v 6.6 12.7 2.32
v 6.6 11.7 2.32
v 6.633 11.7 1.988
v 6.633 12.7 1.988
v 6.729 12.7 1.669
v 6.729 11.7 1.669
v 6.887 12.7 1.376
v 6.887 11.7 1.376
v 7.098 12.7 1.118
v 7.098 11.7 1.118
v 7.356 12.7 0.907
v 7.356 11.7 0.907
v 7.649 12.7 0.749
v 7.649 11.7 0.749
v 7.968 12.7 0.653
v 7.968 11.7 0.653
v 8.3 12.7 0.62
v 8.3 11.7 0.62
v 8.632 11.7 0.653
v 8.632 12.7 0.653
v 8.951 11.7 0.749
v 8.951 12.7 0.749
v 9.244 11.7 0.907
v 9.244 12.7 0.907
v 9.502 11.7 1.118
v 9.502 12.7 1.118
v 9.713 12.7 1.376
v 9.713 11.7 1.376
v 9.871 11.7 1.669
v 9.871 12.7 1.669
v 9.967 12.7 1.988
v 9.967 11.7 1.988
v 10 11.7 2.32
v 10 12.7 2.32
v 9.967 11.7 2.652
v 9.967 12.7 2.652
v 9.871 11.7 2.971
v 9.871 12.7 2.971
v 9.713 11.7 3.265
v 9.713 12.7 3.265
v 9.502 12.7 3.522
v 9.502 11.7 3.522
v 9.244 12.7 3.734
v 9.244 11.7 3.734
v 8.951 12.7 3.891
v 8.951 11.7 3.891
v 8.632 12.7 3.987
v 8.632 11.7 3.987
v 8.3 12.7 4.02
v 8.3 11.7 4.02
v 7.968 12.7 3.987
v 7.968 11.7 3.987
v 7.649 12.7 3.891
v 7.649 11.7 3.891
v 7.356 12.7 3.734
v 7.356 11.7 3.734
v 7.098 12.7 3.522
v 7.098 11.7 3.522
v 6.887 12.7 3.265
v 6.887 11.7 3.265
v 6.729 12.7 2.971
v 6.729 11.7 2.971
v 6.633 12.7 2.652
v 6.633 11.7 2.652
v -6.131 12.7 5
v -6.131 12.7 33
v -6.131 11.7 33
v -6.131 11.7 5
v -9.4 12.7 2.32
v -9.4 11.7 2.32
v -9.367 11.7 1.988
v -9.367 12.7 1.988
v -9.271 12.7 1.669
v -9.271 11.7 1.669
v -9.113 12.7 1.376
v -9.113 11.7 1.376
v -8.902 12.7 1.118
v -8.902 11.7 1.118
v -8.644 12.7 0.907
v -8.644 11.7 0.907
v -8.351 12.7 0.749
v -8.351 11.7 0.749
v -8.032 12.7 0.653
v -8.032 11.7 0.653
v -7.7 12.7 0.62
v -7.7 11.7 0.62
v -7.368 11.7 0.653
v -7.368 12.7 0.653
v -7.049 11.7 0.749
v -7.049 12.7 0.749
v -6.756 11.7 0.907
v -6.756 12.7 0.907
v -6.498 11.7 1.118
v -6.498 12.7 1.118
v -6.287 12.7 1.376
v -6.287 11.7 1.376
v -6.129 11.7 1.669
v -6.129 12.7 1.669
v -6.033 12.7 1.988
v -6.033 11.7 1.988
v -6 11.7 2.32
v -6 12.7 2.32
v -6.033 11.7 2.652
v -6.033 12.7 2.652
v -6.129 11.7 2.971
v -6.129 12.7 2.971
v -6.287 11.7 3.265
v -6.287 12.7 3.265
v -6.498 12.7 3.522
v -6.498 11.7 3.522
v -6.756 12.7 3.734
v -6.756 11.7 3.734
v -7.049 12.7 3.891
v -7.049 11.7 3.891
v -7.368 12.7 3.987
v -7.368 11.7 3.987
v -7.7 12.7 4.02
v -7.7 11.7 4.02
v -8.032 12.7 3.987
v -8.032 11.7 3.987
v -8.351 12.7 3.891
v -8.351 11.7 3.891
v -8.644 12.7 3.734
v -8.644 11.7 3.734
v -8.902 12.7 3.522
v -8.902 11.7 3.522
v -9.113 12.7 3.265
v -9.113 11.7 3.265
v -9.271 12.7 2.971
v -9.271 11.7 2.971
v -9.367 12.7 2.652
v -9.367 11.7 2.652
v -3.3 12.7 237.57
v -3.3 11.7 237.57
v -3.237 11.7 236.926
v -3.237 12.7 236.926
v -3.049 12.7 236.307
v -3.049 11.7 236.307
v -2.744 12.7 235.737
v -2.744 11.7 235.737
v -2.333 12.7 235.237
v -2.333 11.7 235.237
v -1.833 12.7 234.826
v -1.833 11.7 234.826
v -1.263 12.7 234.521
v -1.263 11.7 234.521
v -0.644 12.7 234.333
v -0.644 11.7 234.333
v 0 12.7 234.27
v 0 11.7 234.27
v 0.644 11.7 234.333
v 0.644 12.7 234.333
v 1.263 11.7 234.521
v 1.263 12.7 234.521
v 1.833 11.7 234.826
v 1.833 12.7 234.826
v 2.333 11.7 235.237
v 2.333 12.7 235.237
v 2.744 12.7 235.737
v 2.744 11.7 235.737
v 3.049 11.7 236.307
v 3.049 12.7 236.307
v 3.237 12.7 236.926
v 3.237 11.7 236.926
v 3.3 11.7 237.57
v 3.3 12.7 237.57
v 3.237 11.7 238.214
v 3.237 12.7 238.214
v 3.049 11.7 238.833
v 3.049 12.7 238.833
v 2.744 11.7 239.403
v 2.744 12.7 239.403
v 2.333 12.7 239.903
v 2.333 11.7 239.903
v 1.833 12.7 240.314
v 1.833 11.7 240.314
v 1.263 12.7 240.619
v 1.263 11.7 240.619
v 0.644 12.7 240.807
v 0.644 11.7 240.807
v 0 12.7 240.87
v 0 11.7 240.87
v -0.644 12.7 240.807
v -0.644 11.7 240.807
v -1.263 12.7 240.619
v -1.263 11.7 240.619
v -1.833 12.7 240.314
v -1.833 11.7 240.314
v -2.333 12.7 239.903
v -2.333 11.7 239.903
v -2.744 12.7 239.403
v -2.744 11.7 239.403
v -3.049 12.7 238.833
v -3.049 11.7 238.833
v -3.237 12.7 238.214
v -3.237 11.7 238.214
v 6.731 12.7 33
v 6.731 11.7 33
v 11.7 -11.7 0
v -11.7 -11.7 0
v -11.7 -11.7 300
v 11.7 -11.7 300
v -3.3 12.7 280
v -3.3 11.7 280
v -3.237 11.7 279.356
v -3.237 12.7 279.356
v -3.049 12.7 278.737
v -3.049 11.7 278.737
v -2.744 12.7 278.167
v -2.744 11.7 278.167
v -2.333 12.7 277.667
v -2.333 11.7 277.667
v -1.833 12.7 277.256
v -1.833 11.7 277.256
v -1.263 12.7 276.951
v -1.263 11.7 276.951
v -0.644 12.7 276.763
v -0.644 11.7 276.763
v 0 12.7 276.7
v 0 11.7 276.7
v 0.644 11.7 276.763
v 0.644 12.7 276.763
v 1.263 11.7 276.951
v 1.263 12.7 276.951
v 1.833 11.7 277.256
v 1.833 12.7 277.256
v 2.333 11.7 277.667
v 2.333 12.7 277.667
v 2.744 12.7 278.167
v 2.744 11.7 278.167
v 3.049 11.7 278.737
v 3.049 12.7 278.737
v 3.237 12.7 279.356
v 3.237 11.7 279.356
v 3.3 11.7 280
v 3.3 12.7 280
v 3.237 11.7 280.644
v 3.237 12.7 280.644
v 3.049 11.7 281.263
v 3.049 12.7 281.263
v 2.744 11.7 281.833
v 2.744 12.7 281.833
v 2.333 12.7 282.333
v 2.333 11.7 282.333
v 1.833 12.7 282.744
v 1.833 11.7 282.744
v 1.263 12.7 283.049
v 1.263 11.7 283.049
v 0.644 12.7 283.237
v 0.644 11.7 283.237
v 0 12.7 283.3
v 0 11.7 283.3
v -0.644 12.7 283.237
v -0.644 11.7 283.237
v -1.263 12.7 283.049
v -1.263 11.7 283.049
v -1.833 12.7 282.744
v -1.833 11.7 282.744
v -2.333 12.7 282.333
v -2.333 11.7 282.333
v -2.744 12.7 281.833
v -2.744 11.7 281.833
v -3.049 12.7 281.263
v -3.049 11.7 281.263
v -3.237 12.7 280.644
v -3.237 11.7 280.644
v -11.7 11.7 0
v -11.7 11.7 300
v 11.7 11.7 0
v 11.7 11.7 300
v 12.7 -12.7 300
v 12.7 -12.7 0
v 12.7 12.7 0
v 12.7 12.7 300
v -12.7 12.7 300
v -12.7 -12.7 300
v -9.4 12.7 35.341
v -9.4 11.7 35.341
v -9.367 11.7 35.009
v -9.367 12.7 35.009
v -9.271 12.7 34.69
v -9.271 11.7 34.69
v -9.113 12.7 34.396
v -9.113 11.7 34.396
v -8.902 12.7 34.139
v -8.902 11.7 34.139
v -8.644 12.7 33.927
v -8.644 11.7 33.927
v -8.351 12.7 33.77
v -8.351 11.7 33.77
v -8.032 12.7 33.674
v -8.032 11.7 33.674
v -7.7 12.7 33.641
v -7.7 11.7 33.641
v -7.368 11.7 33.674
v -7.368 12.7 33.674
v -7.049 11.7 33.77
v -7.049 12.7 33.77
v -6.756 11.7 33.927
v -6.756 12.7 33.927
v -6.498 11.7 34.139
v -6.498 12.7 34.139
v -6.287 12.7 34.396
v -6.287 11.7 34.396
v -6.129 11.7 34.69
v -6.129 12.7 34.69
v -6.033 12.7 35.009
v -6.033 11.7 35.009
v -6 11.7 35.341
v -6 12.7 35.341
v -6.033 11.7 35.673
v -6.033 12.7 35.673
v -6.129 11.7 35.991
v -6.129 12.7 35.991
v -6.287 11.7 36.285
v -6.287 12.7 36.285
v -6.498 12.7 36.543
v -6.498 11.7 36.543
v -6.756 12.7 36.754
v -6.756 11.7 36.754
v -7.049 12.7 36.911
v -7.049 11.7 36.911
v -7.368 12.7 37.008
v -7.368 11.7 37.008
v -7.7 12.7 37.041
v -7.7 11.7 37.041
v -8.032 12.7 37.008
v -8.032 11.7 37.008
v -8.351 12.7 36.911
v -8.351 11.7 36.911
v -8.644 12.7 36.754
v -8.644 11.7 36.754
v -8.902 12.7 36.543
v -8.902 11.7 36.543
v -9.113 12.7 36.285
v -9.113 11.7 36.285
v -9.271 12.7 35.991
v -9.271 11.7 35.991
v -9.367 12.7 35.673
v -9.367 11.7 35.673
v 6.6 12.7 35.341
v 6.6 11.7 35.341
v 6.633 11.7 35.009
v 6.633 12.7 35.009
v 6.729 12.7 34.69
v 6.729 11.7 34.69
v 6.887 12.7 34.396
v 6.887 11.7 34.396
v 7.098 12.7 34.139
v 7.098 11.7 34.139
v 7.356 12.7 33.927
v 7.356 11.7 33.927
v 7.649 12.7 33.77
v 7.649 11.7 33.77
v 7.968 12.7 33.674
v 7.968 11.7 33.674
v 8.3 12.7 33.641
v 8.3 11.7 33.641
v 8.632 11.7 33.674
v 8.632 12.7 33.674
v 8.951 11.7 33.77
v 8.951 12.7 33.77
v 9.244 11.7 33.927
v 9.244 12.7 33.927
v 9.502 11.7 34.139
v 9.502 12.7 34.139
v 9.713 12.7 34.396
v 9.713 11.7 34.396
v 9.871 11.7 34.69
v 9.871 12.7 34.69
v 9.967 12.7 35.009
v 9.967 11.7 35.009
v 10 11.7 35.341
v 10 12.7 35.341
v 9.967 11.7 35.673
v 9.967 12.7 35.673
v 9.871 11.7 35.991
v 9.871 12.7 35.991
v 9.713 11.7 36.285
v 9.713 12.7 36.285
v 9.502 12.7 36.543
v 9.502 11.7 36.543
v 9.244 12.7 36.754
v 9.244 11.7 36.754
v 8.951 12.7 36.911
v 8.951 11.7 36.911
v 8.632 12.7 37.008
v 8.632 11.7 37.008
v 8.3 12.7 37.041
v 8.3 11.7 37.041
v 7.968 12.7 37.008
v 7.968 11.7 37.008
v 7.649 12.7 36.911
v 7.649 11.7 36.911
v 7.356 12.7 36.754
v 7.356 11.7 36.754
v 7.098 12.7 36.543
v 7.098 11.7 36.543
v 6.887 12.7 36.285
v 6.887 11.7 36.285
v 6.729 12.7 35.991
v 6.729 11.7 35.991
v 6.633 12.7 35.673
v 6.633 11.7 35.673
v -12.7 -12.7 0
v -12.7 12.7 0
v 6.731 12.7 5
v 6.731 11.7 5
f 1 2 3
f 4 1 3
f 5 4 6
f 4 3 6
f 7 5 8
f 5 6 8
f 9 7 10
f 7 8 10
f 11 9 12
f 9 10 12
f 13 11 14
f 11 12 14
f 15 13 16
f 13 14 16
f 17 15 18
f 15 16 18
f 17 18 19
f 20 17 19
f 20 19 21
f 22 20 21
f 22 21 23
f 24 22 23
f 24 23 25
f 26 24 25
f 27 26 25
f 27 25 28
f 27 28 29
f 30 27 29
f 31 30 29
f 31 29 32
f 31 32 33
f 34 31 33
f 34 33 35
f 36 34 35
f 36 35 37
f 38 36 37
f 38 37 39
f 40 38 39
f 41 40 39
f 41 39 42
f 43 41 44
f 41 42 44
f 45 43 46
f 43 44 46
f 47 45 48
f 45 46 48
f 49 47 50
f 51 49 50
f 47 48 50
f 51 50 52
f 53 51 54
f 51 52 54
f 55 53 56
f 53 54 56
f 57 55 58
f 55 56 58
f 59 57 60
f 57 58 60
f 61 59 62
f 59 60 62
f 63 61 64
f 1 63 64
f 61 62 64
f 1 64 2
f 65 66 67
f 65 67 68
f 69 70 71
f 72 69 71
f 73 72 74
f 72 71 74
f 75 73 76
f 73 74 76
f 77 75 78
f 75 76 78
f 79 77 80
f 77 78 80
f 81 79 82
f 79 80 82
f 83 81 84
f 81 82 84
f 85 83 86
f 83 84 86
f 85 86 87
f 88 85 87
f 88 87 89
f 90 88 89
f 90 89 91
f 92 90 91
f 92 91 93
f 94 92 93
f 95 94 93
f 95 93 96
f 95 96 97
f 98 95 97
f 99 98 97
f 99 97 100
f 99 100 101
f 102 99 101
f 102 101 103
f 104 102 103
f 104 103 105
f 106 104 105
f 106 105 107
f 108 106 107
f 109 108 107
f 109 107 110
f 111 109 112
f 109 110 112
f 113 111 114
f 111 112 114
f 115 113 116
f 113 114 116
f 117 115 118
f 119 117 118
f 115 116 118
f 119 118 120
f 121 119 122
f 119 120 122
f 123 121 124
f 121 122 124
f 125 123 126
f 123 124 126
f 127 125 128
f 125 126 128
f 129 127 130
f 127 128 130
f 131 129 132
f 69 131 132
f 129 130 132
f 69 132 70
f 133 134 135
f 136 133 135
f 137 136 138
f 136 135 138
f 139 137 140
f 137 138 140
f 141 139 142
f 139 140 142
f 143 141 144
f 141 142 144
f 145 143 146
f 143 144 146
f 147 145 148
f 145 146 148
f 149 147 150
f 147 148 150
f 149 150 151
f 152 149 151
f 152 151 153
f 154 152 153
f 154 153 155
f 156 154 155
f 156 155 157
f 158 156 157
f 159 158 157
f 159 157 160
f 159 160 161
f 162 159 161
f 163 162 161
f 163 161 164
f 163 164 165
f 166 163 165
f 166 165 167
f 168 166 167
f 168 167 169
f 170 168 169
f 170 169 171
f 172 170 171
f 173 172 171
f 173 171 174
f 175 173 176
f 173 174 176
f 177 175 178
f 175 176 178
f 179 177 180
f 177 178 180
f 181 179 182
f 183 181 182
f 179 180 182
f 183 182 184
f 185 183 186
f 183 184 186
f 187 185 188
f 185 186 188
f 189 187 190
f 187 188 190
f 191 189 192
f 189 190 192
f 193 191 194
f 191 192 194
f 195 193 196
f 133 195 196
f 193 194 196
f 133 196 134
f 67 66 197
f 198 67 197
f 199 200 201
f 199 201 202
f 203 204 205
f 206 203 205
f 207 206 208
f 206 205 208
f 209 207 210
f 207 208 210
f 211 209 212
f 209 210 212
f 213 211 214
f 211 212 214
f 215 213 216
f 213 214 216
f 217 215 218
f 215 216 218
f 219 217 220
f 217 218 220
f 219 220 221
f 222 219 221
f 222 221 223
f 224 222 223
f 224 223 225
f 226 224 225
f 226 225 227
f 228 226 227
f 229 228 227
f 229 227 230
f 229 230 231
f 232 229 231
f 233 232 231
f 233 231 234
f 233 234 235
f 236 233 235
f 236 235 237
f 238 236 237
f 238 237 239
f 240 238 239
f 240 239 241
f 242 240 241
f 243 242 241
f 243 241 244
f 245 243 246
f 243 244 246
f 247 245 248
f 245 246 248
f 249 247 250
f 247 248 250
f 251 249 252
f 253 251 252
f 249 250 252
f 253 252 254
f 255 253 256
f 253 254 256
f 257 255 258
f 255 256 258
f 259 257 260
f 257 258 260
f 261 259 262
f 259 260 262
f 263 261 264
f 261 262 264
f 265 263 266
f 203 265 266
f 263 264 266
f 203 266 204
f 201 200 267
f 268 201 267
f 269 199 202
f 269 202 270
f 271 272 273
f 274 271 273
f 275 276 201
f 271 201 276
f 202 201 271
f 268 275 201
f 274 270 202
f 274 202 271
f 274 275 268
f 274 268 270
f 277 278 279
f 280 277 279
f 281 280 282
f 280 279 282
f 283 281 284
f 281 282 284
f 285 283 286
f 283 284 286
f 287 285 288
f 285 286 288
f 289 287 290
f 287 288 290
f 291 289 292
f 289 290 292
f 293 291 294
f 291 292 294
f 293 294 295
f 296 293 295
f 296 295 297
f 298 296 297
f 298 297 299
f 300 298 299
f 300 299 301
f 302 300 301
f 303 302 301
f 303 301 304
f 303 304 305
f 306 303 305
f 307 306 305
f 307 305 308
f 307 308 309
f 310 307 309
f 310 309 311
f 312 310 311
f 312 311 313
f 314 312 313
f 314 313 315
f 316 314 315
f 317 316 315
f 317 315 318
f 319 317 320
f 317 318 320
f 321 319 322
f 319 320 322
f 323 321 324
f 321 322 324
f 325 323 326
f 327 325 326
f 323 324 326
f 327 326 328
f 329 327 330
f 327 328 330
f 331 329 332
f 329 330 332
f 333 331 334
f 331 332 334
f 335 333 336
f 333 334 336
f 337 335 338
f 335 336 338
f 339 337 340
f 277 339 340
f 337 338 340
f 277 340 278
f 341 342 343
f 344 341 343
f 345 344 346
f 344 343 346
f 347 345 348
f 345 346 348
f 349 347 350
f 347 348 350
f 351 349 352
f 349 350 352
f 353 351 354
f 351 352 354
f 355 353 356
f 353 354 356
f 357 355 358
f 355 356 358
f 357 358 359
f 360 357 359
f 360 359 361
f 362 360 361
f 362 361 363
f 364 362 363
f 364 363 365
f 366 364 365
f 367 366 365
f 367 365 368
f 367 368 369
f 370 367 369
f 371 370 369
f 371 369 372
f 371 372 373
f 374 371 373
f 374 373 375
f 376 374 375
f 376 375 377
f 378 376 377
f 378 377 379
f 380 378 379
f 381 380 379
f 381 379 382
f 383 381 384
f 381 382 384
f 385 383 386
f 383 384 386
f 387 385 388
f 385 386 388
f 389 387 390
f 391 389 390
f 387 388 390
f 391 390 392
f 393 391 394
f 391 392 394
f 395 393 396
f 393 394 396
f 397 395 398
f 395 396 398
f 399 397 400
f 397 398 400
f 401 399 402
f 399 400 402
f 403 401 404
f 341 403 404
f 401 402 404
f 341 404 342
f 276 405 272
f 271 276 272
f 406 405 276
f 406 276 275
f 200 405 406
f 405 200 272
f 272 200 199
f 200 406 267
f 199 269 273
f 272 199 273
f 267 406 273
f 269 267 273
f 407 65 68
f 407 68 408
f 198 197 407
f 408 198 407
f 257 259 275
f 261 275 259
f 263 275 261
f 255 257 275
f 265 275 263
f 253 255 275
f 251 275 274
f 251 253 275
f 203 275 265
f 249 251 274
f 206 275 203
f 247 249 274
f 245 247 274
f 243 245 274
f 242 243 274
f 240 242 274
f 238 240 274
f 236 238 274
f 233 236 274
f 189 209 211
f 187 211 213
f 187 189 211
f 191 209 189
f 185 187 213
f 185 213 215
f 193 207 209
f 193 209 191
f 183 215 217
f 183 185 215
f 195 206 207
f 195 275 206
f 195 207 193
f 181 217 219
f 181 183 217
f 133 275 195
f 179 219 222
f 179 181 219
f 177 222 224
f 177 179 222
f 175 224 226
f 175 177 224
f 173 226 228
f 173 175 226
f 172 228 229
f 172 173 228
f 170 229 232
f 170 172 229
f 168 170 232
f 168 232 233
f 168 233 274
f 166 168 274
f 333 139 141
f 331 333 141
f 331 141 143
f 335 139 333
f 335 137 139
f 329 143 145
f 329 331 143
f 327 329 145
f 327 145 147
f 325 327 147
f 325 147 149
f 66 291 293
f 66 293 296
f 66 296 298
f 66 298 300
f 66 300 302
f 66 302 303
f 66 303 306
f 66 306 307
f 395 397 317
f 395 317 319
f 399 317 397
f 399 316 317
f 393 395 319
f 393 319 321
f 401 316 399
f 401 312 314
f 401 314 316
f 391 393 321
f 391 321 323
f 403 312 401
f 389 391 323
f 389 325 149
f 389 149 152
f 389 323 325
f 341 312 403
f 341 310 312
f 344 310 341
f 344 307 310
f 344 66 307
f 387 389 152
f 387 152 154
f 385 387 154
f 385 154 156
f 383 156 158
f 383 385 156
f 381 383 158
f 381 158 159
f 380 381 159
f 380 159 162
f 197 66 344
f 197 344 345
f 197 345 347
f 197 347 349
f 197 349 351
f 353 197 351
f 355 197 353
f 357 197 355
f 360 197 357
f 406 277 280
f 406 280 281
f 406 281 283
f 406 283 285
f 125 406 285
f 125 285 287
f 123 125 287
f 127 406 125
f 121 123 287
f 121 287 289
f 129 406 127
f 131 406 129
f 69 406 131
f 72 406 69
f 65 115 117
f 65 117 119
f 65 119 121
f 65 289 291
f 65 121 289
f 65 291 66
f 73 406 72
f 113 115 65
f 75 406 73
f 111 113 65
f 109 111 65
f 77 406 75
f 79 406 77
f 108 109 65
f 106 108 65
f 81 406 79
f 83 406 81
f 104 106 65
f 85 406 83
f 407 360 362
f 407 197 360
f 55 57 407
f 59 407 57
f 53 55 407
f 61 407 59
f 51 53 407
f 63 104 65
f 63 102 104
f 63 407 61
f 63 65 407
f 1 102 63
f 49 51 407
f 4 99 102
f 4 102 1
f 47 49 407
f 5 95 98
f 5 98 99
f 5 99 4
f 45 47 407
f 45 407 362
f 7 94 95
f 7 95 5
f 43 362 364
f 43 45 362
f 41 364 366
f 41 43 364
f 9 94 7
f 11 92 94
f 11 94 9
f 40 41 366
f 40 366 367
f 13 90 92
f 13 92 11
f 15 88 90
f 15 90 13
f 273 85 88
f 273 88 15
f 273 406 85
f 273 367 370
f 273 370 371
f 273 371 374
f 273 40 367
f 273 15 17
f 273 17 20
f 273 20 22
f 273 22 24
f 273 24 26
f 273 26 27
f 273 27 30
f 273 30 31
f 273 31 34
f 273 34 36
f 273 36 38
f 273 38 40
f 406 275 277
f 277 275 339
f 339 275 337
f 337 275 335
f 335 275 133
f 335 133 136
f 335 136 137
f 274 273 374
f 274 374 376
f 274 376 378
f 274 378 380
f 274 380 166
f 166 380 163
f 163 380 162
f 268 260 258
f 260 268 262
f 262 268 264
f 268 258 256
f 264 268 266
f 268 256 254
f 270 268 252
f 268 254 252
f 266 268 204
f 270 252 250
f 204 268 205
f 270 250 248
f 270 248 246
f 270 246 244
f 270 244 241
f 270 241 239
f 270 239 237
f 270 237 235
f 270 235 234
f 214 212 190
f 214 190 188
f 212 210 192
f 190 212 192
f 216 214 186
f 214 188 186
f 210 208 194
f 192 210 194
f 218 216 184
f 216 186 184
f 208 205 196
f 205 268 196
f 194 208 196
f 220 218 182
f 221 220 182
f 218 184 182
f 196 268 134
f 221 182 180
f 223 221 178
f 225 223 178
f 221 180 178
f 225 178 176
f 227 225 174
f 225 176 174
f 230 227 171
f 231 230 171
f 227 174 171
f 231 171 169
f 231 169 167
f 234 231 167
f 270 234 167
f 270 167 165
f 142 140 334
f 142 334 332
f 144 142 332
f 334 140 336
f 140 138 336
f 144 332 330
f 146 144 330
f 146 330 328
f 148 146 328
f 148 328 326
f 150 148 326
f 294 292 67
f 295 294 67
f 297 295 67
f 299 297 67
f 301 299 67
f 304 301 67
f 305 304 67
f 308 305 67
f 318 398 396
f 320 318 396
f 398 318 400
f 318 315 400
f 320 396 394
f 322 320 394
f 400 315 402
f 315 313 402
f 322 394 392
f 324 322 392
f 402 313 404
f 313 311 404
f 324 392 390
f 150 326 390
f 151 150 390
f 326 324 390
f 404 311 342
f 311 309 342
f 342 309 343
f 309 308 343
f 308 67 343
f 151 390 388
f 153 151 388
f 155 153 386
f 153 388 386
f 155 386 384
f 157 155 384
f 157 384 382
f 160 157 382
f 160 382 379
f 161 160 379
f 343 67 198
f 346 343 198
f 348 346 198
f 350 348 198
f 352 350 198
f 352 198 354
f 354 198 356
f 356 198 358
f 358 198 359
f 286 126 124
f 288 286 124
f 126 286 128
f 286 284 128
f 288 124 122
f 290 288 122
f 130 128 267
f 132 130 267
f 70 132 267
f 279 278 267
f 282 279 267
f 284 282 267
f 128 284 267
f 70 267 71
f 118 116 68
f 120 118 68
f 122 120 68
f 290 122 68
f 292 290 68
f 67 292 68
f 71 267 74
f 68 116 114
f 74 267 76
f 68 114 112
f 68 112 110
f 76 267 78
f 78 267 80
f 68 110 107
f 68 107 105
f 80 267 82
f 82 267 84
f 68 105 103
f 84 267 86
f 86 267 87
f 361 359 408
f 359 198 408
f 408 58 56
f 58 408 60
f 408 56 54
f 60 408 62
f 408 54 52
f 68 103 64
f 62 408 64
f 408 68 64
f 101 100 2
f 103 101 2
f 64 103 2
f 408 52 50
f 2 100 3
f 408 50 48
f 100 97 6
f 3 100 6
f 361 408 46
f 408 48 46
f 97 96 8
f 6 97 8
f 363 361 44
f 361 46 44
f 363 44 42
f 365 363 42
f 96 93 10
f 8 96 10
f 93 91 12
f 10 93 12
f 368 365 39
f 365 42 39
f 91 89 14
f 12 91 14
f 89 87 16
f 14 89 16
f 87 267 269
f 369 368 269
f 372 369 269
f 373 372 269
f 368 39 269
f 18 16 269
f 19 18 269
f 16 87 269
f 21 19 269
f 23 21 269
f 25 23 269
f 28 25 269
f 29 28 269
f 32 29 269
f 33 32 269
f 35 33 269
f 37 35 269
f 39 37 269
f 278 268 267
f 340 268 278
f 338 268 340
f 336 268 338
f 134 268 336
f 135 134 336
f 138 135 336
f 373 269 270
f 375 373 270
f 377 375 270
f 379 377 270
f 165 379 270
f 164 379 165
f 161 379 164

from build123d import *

# Parameters (mm, degrees)
SKETCH1_W                = 25.4
SKETCH1_H                = 25.4
SKETCH1_W_2              = 23.4
SKETCH1_H_2              = 23.4
BOSS_EXTRUDE1_DEPTH      = 300
M6_CLEARANCE_HOLE1_D     = 6.6
M6_CLEARANCE_HOLE1_DEPTH = 10
M6_CLEARANCE_HOLE1_TIP   = 1.982840043
SKETCH5_W                = 12.861112754
SKETCH5_H                = 28
CUT_EXTRUDE2_DEPTH       = 10
M3_CLEARANCE_HOLE1_D     = 3.4
M3_CLEARANCE_HOLE1_DEPTH = 10
M3_CLEARANCE_HOLE1_TIP   = 1.021463052


with BuildPart() as part:
    # Sketch1 → Boss-Extrude1 (new body)
    with BuildSketch(Plane.XY):
        Rectangle(SKETCH1_W, SKETCH1_H)
        Rectangle(SKETCH1_W_2, SKETCH1_H_2, mode=Mode.SUBTRACT)
    extrude(amount=BOSS_EXTRUDE1_DEPTH)

    # M6 Clearance Hole1
    with Locations(Plane(origin=(0, 12.7, 0), x_dir=(1, 0, 0), z_dir=(0, 1, 0))):
        with Locations((0, -280), (0, -237.57)):
            Hole(M6_CLEARANCE_HOLE1_D / 2, depth=M6_CLEARANCE_HOLE1_DEPTH)
            with Locations((0, 0, -(M6_CLEARANCE_HOLE1_DEPTH + M6_CLEARANCE_HOLE1_TIP / 2))):  # 118° drill point
                Cone(0, M6_CLEARANCE_HOLE1_D / 2, M6_CLEARANCE_HOLE1_TIP, mode=Mode.SUBTRACT)

    # Sketch5 → Cut-Extrude2 (cut)
    with BuildSketch(Plane(origin=(0, 12.7, 0), x_dir=(1, 0, 0), z_dir=(0, 1, 0))):
        with Locations((0.3, -19)):
            Rectangle(SKETCH5_W, SKETCH5_H)
    extrude(amount=-CUT_EXTRUDE2_DEPTH, mode=Mode.SUBTRACT)

    # M3 Clearance Hole1
    with Locations(Plane(origin=(0, 12.7, 0), x_dir=(1, 0, 0), z_dir=(0, 1, 0))):
        with Locations((8.3, -2.320031624), (-7.7, -2.320031624), (-7.7, -35.340858472), (8.3, -35.340858472)):
            Hole(M3_CLEARANCE_HOLE1_D / 2, depth=M3_CLEARANCE_HOLE1_DEPTH)
            with Locations((0, 0, -(M3_CLEARANCE_HOLE1_DEPTH + M3_CLEARANCE_HOLE1_TIP / 2))):  # 118° drill point
                Cone(0, M3_CLEARANCE_HOLE1_D / 2, M3_CLEARANCE_HOLE1_TIP, mode=Mode.SUBTRACT)


solid = part.part
